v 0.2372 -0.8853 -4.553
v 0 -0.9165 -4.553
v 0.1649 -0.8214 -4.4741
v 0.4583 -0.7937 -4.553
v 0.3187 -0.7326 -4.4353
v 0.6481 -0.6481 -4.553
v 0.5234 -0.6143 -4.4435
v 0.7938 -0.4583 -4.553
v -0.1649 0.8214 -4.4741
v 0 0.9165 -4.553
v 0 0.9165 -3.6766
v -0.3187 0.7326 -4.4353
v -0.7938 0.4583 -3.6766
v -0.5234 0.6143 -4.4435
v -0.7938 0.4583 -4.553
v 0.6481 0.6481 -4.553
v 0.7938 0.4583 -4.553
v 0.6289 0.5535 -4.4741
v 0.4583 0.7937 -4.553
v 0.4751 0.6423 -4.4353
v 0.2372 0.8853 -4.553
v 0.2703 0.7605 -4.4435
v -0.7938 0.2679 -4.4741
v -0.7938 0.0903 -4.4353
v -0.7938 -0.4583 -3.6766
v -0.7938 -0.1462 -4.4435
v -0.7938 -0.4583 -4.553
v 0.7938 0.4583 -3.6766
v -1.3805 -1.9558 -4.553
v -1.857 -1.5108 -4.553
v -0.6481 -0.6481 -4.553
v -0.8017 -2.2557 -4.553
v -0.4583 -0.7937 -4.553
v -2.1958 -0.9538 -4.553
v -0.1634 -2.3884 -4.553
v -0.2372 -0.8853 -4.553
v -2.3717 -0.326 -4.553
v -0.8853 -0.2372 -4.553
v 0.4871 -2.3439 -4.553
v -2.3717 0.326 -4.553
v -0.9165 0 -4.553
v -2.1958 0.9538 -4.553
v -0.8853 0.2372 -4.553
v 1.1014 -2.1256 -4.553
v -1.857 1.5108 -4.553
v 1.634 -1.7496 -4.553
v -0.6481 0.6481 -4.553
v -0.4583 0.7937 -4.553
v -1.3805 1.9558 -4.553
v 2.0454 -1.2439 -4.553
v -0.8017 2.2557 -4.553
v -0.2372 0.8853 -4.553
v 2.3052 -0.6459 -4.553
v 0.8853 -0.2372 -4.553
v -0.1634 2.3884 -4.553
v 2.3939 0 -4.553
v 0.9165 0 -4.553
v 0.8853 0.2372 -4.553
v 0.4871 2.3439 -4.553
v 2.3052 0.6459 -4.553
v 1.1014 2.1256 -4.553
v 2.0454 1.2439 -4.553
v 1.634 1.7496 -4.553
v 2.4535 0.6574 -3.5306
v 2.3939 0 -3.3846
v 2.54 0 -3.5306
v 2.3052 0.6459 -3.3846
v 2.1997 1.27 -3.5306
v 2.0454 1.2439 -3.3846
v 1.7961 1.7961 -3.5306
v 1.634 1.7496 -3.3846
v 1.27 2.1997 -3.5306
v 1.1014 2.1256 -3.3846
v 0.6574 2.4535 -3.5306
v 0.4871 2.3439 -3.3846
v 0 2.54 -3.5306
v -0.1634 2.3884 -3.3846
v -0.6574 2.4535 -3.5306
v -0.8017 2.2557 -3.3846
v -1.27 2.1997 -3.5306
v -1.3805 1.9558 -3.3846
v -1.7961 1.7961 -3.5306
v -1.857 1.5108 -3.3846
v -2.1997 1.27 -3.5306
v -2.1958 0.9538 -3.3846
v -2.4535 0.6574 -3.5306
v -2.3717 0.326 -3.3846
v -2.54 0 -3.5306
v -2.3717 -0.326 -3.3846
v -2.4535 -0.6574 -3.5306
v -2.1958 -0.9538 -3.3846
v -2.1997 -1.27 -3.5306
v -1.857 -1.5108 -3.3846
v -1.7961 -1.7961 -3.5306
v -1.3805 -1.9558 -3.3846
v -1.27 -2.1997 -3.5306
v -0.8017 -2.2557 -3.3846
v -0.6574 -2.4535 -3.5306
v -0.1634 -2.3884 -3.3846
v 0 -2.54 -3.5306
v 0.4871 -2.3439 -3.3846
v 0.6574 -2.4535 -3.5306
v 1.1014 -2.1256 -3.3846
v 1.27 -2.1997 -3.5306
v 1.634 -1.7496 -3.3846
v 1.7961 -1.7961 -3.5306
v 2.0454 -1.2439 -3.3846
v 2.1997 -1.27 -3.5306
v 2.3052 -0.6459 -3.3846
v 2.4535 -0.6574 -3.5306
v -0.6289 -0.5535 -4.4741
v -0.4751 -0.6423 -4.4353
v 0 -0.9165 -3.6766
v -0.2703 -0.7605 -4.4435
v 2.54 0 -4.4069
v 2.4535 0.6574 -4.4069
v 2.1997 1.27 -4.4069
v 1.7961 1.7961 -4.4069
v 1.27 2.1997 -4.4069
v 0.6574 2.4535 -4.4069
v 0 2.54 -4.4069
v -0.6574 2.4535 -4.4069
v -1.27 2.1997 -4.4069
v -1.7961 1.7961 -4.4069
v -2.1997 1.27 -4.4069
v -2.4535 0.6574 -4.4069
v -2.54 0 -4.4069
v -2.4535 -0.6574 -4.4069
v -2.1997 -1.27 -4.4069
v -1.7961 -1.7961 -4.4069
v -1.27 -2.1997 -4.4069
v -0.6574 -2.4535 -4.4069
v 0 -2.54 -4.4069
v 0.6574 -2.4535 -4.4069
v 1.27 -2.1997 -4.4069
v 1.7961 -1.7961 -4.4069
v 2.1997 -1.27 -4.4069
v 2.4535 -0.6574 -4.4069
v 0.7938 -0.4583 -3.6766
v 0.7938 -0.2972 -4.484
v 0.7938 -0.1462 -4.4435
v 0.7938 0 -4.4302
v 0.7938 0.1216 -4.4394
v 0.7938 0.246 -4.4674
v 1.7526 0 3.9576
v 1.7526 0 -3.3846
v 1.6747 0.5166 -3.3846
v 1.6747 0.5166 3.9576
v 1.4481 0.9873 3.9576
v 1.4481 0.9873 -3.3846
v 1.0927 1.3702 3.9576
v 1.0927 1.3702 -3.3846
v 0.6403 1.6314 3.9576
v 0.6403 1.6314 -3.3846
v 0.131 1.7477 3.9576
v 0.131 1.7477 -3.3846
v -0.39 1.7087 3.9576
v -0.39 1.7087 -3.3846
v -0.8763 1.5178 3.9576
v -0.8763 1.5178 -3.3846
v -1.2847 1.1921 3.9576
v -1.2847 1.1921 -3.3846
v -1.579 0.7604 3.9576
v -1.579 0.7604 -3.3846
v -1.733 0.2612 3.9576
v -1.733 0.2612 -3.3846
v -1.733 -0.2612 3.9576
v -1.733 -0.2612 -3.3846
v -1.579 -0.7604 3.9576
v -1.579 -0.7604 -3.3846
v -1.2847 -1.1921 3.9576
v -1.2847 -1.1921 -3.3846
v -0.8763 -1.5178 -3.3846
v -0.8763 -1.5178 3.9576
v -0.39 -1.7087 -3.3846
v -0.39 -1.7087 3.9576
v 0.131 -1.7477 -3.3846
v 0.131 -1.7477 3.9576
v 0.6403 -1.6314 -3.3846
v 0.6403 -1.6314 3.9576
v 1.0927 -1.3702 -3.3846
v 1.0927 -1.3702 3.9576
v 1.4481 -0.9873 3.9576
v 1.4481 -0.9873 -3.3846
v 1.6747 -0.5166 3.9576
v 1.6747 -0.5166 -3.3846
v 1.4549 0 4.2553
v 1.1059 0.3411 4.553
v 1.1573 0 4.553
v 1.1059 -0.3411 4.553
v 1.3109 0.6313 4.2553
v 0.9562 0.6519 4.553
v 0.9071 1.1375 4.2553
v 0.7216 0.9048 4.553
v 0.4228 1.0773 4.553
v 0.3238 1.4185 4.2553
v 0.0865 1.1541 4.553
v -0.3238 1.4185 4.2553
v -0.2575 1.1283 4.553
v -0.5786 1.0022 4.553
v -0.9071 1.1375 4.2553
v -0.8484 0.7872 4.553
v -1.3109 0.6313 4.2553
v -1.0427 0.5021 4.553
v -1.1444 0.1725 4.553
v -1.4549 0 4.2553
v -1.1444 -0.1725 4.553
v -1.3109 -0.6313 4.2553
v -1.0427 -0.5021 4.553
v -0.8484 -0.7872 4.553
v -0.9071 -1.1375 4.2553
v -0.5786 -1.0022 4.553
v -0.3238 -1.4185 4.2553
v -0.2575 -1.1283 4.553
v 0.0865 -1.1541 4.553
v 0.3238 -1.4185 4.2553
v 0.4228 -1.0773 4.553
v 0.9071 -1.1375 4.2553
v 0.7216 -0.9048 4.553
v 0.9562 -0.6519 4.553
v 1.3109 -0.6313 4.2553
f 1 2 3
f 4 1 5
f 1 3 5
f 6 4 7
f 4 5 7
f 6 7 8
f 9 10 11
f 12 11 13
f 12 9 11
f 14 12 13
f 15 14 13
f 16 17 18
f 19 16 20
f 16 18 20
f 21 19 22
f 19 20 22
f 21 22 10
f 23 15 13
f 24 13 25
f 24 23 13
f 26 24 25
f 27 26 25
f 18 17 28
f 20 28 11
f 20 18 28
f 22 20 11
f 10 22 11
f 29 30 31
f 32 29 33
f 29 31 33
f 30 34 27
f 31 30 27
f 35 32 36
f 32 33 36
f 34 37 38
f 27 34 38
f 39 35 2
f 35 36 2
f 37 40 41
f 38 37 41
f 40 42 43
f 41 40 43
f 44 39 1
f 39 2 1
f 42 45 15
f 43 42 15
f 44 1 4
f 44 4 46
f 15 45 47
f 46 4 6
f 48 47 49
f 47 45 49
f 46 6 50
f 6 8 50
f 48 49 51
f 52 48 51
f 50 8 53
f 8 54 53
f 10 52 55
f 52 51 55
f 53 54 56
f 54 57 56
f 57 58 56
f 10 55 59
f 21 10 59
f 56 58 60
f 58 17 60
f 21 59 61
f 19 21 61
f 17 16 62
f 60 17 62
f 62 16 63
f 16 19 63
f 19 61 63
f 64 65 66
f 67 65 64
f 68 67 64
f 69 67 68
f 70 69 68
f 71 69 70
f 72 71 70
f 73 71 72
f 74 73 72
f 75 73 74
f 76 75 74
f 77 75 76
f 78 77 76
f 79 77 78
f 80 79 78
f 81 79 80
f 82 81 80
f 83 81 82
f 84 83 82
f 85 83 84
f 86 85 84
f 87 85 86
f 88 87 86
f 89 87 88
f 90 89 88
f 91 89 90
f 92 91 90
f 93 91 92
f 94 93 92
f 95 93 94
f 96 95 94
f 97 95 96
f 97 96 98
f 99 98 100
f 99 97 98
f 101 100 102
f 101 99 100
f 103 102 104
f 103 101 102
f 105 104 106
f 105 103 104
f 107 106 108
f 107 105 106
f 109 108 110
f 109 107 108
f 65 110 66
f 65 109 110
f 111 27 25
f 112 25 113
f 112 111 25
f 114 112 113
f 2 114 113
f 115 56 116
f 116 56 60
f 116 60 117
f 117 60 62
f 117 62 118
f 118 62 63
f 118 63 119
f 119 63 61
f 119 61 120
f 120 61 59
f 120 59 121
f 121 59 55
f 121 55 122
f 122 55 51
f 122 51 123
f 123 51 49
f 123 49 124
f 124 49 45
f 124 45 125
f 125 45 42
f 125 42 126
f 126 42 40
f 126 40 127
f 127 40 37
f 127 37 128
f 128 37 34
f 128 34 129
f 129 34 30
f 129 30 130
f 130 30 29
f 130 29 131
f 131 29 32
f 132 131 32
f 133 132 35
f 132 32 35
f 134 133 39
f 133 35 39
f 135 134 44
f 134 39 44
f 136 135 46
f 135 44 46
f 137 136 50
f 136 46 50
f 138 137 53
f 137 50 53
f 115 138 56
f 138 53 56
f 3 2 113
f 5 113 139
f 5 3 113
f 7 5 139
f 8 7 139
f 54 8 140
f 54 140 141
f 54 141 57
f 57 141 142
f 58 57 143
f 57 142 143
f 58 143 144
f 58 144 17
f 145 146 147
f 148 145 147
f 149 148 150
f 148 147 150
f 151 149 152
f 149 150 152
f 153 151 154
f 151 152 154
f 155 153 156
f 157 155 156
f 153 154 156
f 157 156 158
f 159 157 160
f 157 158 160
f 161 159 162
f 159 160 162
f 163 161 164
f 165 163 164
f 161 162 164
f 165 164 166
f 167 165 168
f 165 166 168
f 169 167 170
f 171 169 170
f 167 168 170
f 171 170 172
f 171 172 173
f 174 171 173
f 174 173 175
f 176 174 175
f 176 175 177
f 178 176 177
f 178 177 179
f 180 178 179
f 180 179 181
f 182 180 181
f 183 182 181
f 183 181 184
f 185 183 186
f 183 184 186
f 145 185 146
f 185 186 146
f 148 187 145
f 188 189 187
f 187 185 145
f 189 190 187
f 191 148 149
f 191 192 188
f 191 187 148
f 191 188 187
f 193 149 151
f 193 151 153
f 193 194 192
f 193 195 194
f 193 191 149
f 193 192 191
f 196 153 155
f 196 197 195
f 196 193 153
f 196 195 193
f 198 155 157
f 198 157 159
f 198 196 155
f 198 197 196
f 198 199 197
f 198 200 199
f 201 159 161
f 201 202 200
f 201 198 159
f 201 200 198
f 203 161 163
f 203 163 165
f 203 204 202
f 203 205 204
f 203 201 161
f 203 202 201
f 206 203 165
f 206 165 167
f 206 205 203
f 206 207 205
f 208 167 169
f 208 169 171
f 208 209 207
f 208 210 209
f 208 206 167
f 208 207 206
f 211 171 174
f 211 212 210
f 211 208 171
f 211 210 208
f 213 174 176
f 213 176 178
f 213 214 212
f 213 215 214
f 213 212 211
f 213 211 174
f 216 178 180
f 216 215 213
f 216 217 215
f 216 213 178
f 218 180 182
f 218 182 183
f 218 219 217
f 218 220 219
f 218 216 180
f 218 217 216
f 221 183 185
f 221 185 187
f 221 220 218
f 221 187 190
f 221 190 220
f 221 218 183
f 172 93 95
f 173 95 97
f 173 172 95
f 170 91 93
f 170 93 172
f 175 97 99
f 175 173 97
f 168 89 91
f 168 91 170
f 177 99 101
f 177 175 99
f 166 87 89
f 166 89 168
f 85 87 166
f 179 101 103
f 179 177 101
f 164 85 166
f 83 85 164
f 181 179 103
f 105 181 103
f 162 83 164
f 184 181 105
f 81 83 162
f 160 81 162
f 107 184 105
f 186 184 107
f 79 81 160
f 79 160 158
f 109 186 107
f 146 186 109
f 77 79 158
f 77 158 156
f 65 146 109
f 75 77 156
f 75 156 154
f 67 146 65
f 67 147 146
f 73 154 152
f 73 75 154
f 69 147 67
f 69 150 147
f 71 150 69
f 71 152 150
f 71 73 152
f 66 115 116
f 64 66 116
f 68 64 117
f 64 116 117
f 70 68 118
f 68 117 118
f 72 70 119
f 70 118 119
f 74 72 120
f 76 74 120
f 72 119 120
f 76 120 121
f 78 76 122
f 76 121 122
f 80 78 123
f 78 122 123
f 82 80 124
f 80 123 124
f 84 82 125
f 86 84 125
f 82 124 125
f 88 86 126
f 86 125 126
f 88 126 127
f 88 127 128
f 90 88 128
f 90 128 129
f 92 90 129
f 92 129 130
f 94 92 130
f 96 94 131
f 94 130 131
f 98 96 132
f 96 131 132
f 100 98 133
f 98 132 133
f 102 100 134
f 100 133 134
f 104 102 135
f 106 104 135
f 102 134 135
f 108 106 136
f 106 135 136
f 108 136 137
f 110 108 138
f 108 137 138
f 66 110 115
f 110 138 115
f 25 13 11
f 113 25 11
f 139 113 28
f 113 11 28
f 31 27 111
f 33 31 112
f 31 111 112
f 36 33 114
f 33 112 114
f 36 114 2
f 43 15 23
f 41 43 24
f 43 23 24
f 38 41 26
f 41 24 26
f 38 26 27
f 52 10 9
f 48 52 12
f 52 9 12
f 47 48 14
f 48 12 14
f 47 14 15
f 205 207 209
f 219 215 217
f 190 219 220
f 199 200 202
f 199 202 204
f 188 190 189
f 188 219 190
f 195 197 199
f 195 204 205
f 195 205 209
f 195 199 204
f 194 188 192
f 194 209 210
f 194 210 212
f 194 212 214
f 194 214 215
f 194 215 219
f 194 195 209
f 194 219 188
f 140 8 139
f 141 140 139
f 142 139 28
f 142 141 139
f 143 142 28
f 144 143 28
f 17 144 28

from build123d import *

# Parameters (mm, degrees)
EXTRUDE1_START     = -3.38455
SKETCH1_R          = 1.7526
EXTRUDE1_DEPTH     = 7.9375
EXTRUDE2_START     = -4.55295
SKETCH6_R          = 2.54
EXTRUDE2_DEPTH     = 1.1684
CUT_EXTRUDE1_DEPTH = 0.8763
SKETCH8_R          = 0.916543552
CUT_EXTRUDE2_DEPTH = 0.8763
CUT_EXTRUDE2_TAPER = 45
CHAMFER1_SIZE      = 0.14605
CHAMFER2_SIZE      = 0.5953125


with BuildPart() as part:
    # Sketch1 → Extrude1 (new body)
    with BuildSketch(Plane.XY.offset(EXTRUDE1_START)):
        Circle(SKETCH1_R)
    extrude(amount=EXTRUDE1_DEPTH)

    # Sketch6 → Extrude2 (add)
    with BuildSketch(Plane.XY.offset(EXTRUDE2_START)):
        Circle(SKETCH6_R)
    extrude(amount=EXTRUDE2_DEPTH)

    # Sketch7 → Cut-Extrude1 (cut)
    with BuildSketch(Plane.XY.offset(-4.55295)):
        Polygon((0, 0.916543552), (-0.79375, 0.458271776), (-0.79375, -0.458271776), (0, -0.916543552), (0.79375, -0.458271776), (0.79375, 0.458271776), align=None)
    extrude(amount=CUT_EXTRUDE1_DEPTH, mode=Mode.SUBTRACT)

    # Sketch8 → Cut-Extrude2 (cut)
    with BuildSketch(Plane.XY.offset(-4.55295)):
        Circle(SKETCH8_R)
    extrude(amount=CUT_EXTRUDE2_DEPTH, taper=CUT_EXTRUDE2_TAPER, mode=Mode.SUBTRACT)

    # Chamfer1
    chamfer1_edges = [part.edges().sort_by_distance(p)[0] for p in [
        (-2.54, 0, -3.38455),
        (-2.54, 0, -4.55295),
    ]]
    chamfer(chamfer1_edges, length=CHAMFER1_SIZE)

    # Chamfer2
    chamfer2_edges = [part.edges().sort_by_distance(p)[0] for p in [
        (-1.7526, 0, 4.55295),
    ]]
    chamfer(chamfer2_edges, length=CHAMFER2_SIZE)


solid = part.part
